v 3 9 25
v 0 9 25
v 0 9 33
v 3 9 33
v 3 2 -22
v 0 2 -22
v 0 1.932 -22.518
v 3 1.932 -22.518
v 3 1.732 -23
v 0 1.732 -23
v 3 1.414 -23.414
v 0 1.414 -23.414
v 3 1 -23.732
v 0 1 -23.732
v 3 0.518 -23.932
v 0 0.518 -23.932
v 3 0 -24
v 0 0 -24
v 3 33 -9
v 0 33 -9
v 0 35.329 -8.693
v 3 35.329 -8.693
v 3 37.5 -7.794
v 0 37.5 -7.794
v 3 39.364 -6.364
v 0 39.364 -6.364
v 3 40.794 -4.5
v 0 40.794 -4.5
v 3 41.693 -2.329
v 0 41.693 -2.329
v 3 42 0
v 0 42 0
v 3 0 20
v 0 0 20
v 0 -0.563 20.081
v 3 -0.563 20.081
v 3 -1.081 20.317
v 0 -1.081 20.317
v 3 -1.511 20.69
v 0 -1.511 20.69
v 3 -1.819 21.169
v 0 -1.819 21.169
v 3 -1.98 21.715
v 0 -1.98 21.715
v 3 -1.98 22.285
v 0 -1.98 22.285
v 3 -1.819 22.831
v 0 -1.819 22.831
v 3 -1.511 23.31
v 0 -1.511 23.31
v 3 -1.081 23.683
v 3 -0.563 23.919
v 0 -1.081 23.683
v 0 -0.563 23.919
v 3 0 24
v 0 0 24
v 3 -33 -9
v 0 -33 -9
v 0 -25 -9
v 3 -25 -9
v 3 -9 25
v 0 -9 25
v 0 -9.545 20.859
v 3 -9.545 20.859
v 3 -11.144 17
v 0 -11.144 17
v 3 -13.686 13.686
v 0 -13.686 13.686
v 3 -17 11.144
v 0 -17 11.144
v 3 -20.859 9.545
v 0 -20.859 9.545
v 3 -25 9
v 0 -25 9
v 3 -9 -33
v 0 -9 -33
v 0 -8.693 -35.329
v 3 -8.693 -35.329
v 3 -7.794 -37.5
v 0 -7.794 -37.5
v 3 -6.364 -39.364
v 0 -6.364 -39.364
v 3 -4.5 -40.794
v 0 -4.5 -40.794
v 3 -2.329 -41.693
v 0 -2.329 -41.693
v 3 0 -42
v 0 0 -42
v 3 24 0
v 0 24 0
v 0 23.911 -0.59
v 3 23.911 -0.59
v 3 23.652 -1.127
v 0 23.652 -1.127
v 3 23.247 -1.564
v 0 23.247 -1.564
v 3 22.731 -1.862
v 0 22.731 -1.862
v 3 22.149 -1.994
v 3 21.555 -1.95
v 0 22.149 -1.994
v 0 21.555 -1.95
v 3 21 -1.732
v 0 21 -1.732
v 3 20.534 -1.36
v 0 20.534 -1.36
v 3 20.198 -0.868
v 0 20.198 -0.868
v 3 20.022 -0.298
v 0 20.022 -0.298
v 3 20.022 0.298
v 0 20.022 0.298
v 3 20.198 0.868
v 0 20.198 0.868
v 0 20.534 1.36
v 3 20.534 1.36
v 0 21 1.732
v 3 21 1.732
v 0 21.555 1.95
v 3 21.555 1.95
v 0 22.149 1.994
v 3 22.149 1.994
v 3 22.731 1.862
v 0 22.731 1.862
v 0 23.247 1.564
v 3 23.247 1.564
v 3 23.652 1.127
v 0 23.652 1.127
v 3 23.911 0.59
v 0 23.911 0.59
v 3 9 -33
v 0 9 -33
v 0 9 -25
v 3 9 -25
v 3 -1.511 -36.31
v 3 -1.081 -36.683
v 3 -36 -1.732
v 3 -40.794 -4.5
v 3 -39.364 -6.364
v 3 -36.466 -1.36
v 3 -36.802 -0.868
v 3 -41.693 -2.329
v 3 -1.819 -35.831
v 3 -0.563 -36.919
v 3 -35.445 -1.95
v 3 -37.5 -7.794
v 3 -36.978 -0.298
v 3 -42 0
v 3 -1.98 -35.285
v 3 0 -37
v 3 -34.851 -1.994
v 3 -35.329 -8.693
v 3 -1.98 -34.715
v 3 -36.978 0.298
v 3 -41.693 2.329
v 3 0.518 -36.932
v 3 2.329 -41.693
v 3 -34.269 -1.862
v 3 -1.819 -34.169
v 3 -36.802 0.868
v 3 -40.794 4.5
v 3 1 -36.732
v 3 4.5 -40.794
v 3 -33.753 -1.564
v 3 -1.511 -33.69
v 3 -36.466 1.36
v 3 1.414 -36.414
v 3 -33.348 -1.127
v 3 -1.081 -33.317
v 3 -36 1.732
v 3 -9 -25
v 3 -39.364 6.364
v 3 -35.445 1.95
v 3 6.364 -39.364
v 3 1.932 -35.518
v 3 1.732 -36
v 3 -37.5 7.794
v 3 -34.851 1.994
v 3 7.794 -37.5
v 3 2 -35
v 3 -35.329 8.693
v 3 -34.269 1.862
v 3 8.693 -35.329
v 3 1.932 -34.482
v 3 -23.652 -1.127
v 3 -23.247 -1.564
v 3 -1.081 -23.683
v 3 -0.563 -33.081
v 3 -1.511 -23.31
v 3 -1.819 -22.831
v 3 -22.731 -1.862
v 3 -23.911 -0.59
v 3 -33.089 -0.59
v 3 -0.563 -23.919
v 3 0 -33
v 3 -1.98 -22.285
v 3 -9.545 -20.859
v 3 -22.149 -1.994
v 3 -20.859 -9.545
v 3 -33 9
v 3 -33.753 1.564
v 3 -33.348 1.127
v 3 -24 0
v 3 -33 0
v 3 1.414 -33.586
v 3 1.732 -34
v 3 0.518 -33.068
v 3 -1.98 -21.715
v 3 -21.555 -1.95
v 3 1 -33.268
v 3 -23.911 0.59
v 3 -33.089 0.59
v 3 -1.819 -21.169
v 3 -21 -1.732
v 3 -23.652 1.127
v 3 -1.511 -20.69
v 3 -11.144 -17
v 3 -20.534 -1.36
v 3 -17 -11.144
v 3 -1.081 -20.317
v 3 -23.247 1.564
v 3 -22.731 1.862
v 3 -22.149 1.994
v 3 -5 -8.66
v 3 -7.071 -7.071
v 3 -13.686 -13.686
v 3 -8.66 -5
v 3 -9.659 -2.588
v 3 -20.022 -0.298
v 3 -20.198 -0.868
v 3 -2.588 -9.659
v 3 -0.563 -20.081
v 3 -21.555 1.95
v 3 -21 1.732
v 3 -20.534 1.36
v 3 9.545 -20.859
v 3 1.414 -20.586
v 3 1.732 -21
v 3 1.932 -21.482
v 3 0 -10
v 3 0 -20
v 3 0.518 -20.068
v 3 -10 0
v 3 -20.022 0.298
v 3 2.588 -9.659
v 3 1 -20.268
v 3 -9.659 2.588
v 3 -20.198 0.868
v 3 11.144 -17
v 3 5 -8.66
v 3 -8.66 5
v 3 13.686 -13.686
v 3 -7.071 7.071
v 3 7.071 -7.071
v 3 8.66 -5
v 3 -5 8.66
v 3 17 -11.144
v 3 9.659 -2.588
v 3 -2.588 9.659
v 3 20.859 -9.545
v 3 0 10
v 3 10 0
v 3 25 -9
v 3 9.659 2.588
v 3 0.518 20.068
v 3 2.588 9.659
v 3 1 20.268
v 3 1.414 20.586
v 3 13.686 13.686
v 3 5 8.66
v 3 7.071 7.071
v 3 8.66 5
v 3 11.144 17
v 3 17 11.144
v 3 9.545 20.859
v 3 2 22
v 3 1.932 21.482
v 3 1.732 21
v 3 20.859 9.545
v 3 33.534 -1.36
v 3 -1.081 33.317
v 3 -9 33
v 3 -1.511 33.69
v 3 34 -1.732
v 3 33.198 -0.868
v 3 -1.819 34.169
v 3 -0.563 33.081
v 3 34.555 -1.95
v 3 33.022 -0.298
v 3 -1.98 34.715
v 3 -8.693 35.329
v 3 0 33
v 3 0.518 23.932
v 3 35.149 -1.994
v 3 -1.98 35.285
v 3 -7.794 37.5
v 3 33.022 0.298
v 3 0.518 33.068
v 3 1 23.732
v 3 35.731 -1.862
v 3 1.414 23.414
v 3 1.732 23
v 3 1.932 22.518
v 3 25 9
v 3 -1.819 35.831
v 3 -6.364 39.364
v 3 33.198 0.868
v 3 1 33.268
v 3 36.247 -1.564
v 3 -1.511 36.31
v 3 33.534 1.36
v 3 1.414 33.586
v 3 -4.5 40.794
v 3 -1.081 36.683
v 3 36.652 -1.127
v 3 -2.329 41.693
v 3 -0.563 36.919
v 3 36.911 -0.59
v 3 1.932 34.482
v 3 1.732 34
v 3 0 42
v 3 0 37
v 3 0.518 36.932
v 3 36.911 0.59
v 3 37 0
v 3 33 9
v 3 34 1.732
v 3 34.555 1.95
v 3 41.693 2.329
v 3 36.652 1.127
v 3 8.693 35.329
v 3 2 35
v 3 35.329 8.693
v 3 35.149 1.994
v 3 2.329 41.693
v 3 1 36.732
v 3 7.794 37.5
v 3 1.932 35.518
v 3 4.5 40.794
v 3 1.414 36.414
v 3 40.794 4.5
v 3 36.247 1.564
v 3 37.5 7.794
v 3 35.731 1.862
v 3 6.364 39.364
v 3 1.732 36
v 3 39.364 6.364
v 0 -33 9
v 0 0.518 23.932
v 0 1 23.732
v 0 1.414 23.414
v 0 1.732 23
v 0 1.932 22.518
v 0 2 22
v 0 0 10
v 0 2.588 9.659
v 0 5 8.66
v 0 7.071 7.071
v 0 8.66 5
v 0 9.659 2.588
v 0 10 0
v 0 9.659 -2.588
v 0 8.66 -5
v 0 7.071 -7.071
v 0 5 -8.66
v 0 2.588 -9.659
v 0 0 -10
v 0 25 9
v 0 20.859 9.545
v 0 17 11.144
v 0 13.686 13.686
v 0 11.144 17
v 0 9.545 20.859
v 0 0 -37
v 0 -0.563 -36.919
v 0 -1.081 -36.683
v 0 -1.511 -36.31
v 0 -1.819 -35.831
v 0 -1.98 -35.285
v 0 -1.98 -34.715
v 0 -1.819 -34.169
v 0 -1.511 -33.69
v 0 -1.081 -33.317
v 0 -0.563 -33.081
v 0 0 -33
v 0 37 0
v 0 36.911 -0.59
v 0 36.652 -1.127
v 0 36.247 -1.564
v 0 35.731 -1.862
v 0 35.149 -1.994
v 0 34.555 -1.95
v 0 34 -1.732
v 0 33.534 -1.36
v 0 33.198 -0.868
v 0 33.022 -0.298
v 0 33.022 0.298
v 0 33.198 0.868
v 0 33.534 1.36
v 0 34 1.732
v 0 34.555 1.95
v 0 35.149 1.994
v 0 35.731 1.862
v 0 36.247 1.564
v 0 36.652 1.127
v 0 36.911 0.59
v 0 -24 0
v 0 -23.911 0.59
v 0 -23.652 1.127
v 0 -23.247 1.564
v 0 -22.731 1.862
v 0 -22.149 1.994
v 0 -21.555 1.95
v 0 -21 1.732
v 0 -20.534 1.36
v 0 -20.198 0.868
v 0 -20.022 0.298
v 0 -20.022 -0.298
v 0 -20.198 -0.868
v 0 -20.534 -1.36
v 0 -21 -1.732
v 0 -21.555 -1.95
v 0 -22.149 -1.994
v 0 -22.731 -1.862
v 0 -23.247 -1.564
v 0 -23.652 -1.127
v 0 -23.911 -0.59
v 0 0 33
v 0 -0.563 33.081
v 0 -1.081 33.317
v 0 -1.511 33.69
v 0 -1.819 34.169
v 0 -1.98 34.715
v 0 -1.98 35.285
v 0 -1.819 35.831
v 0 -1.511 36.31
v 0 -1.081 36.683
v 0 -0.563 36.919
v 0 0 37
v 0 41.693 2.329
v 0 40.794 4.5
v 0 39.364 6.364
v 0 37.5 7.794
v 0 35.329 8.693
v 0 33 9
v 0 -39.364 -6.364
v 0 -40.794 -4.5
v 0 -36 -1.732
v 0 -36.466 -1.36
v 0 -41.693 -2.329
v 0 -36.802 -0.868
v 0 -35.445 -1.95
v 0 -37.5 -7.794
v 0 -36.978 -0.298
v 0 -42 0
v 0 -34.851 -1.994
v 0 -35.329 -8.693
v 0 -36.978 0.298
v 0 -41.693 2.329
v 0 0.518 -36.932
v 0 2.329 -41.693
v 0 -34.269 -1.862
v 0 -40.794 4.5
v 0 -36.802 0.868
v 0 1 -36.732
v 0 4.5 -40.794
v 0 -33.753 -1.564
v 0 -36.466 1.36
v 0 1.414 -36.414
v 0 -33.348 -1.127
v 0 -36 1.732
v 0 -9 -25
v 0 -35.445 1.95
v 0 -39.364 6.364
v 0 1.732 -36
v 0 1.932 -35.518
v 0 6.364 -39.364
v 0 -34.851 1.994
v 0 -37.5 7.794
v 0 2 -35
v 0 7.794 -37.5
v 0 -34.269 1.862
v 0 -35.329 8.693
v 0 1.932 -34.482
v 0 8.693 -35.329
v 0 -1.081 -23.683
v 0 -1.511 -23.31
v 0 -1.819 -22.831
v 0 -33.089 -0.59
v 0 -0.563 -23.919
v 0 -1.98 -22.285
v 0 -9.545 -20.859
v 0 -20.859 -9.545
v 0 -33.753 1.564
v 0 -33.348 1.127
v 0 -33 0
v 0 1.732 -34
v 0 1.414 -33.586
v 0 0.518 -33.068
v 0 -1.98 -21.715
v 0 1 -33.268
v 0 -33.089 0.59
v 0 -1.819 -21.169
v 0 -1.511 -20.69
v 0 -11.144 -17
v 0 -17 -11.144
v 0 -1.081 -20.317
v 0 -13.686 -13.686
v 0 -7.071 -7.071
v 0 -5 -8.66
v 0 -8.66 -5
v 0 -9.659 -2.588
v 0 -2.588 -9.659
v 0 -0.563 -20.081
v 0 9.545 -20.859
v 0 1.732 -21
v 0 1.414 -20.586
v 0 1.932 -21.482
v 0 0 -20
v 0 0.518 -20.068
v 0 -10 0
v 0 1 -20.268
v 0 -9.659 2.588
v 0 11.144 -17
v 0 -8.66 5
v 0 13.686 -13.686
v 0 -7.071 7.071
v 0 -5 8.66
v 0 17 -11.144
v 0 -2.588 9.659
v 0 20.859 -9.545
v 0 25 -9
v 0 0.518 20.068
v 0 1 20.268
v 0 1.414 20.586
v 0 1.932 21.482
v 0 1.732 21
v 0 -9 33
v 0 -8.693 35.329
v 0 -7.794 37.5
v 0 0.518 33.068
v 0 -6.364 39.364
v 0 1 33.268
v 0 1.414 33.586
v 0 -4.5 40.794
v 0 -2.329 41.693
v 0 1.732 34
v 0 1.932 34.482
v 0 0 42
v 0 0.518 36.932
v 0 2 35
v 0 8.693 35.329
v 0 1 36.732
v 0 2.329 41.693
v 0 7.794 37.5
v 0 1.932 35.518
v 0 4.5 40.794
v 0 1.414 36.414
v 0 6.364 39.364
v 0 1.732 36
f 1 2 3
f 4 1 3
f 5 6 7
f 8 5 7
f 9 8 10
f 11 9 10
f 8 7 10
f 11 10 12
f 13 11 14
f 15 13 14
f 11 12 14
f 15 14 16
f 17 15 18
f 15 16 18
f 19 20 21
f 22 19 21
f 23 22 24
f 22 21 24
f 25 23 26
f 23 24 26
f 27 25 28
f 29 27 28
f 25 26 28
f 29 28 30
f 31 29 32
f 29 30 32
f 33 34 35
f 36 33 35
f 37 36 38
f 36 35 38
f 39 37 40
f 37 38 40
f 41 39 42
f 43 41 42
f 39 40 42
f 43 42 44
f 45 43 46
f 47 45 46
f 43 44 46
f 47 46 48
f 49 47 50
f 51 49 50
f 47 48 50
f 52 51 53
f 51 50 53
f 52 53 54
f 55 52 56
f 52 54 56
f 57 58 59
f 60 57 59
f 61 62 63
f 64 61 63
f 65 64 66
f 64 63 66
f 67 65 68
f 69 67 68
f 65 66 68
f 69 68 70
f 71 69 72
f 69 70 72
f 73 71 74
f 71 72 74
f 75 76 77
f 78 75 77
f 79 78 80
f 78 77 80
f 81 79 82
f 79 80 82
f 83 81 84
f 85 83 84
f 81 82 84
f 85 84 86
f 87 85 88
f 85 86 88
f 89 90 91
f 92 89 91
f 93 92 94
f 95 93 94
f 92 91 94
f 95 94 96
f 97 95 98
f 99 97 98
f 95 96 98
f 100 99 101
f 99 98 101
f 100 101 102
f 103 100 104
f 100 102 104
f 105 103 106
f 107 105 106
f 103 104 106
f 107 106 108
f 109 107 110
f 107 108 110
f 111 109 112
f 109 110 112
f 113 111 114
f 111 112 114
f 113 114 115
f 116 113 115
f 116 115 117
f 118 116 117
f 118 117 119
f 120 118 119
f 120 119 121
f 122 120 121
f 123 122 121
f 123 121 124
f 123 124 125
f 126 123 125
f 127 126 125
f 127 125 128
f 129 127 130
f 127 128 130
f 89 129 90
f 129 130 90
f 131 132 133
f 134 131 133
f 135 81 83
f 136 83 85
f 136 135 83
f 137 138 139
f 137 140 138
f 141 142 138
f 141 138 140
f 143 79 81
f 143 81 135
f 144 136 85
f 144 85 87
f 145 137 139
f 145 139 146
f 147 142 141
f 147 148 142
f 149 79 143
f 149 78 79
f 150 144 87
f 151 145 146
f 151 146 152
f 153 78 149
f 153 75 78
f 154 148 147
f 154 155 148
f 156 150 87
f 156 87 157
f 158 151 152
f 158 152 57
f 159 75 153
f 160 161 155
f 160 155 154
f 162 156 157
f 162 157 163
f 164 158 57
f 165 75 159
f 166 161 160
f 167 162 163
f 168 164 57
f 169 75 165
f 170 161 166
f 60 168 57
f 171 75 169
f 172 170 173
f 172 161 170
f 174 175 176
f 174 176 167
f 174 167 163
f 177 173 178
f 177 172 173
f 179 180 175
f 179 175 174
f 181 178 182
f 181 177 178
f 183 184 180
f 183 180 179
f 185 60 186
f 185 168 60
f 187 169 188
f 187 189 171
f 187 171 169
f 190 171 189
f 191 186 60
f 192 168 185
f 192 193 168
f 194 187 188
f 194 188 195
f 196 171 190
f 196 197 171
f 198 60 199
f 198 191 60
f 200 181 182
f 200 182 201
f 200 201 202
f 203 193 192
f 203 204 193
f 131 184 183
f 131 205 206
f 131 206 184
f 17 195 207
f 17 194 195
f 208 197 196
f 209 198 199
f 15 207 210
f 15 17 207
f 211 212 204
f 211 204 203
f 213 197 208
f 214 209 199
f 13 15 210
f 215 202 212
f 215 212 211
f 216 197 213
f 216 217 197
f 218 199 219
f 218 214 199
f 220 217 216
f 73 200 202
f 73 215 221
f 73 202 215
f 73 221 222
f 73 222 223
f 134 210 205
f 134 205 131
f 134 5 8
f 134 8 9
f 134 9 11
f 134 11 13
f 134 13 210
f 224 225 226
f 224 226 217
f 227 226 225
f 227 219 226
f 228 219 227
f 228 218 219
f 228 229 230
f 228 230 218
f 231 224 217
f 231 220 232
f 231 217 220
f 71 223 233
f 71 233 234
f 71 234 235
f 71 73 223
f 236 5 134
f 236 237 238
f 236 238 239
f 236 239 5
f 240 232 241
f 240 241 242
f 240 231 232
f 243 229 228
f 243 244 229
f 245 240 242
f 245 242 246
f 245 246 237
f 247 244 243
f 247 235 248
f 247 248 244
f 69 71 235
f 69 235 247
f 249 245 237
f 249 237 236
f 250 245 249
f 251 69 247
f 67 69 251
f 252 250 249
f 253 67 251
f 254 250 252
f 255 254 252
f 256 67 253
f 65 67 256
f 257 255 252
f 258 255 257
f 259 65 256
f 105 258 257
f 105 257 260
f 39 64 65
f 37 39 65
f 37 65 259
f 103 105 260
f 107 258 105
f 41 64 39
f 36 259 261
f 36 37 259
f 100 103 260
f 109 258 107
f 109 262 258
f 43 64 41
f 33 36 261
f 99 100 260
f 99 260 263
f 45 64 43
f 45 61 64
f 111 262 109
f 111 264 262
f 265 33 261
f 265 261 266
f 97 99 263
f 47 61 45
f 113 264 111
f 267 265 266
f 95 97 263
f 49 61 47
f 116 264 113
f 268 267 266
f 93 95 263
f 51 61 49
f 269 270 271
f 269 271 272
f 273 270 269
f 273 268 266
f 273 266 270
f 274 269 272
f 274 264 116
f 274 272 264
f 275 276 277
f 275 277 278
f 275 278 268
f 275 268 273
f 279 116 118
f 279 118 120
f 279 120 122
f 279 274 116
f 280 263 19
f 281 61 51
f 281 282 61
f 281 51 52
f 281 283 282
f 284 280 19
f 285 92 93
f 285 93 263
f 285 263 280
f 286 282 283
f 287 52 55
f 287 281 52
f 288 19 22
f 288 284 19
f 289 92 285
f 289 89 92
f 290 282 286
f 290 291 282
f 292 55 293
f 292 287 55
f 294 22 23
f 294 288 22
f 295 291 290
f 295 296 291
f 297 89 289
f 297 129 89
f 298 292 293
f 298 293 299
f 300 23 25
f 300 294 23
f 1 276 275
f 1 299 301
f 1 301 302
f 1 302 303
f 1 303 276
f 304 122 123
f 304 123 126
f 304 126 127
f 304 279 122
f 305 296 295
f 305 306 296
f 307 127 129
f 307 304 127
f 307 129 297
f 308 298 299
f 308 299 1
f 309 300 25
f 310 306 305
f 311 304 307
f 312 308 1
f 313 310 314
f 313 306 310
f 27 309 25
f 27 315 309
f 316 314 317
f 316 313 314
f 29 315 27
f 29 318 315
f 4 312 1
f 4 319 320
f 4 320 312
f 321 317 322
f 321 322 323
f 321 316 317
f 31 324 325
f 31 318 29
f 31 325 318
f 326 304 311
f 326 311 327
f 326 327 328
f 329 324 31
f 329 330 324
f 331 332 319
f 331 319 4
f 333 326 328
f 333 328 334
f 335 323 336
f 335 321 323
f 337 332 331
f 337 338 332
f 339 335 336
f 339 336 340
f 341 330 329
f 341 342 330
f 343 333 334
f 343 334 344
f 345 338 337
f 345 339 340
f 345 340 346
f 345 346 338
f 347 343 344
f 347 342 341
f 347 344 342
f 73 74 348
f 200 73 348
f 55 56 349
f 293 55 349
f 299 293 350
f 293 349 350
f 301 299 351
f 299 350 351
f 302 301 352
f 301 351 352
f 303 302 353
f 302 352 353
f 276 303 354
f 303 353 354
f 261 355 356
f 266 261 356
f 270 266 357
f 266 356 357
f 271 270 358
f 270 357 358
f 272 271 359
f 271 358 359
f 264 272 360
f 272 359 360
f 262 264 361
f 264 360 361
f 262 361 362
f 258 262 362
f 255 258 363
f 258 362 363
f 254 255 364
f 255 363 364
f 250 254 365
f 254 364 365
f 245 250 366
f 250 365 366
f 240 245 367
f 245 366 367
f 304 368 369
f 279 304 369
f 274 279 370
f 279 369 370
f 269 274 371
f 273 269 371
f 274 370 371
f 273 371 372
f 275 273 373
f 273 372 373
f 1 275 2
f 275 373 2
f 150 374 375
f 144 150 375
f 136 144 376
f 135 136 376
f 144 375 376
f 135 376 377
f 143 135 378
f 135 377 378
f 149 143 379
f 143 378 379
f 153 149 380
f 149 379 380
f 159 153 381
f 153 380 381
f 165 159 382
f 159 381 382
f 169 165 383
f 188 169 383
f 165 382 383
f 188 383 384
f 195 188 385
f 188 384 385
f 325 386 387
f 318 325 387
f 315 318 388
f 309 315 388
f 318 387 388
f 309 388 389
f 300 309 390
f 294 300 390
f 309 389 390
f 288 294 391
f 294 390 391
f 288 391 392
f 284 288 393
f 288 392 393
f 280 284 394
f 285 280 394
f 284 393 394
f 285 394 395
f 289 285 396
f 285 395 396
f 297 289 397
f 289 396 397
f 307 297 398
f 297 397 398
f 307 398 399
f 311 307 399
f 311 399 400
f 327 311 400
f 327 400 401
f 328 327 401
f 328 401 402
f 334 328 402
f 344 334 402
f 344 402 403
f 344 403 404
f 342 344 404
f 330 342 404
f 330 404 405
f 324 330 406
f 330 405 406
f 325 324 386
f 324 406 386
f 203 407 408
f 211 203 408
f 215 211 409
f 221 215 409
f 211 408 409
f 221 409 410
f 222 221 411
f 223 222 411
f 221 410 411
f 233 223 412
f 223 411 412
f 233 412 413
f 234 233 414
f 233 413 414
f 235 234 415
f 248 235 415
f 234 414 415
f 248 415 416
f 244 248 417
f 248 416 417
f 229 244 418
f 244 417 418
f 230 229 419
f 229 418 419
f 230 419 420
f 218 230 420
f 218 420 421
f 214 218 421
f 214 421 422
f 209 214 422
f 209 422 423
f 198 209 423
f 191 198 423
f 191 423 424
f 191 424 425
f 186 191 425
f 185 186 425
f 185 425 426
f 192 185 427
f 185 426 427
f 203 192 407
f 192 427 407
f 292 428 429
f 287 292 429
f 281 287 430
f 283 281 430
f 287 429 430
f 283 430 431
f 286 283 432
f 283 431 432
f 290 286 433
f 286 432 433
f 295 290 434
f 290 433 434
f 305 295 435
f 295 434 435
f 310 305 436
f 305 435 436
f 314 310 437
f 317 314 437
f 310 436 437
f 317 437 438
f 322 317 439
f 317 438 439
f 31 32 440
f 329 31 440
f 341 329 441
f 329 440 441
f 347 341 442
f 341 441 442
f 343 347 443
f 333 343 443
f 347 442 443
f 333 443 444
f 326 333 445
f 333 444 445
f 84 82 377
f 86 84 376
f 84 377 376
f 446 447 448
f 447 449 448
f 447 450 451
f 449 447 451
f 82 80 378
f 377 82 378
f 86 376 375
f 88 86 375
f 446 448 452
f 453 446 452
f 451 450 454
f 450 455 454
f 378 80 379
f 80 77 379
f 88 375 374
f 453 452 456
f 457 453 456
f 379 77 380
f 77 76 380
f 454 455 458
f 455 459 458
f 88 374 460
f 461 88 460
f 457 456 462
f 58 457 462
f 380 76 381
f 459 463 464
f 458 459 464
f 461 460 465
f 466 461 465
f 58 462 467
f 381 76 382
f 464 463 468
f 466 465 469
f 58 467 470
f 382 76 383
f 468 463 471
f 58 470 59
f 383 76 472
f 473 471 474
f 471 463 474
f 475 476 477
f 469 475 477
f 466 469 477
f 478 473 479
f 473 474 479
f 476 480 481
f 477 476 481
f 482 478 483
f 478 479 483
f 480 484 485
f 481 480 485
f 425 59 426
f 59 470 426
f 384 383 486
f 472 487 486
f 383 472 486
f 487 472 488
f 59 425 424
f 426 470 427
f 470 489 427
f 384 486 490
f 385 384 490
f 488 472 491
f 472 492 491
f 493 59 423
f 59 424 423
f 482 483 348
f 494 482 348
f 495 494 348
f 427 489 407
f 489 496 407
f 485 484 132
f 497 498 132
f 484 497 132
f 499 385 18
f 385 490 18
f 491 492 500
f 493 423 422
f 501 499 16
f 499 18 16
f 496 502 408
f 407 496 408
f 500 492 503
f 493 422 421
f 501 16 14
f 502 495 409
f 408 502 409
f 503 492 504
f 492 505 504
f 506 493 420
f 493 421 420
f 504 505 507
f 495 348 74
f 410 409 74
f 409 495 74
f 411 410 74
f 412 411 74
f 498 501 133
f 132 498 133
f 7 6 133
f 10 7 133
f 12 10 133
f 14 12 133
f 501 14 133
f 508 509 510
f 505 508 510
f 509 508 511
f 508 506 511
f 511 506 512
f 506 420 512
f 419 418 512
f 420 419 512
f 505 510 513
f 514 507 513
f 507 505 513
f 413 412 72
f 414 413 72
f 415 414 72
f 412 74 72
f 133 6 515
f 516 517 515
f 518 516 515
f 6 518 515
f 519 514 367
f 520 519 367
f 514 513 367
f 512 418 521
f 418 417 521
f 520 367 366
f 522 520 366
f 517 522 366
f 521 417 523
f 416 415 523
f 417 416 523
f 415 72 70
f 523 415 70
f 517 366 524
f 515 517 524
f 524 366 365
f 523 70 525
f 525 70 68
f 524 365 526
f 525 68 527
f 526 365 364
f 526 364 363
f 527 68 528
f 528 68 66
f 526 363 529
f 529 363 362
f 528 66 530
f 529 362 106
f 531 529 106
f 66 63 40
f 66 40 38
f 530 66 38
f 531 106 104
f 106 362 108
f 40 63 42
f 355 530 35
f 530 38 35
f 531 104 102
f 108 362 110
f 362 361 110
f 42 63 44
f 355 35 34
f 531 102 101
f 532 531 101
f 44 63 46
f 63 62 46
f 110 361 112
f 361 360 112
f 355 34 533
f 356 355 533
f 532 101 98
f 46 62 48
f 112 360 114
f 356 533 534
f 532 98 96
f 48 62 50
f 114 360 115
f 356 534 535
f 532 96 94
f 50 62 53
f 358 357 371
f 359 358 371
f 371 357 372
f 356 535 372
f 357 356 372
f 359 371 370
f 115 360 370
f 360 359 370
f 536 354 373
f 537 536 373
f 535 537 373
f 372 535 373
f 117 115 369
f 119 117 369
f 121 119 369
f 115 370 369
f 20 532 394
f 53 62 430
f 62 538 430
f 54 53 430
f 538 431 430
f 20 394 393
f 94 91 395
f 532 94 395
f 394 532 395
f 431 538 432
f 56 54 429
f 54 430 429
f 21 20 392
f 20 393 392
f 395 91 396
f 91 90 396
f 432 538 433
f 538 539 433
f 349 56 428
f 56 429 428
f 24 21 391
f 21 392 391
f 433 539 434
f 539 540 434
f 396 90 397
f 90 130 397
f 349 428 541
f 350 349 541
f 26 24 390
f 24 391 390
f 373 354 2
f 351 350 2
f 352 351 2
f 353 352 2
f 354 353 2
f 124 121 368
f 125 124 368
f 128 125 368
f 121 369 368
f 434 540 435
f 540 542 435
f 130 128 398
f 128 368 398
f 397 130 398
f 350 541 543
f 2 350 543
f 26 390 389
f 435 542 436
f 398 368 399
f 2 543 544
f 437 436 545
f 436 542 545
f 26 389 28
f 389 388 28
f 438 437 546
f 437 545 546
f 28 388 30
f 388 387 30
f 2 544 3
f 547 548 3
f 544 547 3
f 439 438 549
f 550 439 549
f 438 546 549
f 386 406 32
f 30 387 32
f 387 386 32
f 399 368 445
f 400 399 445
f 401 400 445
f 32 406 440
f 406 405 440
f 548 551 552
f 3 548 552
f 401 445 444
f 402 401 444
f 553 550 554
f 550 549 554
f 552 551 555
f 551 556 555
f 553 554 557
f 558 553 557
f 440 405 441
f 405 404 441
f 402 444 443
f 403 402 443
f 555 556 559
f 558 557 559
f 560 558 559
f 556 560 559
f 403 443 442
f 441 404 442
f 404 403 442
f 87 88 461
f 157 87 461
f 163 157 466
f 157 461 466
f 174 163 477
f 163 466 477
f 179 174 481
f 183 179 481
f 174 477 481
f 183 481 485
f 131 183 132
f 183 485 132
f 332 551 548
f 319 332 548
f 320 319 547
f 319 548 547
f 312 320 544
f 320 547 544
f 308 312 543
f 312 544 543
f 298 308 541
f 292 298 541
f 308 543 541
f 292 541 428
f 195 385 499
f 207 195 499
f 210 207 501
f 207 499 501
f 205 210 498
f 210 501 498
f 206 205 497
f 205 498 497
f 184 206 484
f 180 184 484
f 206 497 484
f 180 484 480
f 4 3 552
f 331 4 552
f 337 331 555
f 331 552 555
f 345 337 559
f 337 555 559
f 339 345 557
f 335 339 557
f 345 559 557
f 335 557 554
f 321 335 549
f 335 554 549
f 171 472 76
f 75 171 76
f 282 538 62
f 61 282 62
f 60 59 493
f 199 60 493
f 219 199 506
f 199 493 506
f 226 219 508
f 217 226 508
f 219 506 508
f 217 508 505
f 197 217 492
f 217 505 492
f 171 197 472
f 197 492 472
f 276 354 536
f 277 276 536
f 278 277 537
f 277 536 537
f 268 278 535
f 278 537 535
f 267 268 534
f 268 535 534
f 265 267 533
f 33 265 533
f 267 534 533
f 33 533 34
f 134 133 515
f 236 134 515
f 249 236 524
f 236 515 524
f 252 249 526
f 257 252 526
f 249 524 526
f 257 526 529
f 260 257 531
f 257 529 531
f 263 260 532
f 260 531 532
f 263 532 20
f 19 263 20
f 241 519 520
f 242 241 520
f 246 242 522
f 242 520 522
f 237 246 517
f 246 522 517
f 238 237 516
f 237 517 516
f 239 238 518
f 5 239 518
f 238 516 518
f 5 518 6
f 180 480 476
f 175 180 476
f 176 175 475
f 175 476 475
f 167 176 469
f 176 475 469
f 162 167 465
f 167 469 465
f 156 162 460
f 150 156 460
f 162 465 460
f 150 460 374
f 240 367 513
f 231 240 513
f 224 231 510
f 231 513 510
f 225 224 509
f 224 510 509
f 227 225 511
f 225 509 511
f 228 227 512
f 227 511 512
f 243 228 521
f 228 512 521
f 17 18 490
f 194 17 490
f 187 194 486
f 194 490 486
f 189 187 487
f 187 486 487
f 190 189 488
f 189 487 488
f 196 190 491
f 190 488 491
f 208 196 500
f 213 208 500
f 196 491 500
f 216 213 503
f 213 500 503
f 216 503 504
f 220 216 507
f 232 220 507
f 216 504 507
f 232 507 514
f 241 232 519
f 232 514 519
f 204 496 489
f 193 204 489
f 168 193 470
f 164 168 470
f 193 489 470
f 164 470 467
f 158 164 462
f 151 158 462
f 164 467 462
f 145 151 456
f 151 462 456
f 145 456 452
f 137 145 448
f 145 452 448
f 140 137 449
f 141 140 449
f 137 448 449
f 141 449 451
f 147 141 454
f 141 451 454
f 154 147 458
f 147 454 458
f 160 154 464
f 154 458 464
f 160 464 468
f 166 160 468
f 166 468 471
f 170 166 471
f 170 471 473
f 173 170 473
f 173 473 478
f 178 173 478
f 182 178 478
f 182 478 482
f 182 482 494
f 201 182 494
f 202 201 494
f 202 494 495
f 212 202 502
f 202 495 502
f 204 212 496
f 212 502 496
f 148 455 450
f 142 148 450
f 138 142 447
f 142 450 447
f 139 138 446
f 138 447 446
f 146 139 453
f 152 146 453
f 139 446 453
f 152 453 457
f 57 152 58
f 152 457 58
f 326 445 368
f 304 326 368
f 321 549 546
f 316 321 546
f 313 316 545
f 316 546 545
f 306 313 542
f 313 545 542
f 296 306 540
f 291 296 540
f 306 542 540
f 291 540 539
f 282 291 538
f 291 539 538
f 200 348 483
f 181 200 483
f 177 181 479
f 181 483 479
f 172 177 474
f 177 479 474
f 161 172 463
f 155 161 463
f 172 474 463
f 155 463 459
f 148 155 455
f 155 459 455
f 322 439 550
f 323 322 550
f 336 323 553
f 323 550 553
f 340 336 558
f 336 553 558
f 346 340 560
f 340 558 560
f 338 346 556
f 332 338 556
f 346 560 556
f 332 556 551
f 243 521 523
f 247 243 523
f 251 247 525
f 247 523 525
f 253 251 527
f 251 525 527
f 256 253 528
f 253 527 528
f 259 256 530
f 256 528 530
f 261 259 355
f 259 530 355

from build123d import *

# Parameters (mm, degrees)
F1_DEPTH = 3


with BuildPart() as f1:
    # F0 (on Right) → F1 (new body)
    with BuildSketch(Plane.YZ):
        with BuildLine():
            Line((-33, 9), (-33, 0))
            Line((-33, 0), (-24, 0))
            ThreePointArc((-24, 0), (-26.6360389693, 6.3639610307), (-33, 9))
        make_face()
        with BuildLine():
            ThreePointArc((-37, 0), (-35, 2), (-33, 0))
            Line((-33, 0), (-33, 9))
            ThreePointArc((-33, 9), (-39.3639610307, 6.3639610307), (-42, 0))
            Line((-42, 0), (-37, 0))
        make_face()
        with BuildLine():
            Line((-24, 0), (-33, 0))
            Line((-33, 0), (-33, -9))
            ThreePointArc((-33, -9), (-26.6360389693, -6.3639610307), (-24, 0))
        make_face()
        with BuildLine():
            Line((-33, -9), (-33, 0))
            ThreePointArc((-33, 0), (-35, -2), (-37, 0))
            Line((-37, 0), (-42, 0))
            ThreePointArc((-42, 0), (-39.3639610307, -6.3639610307), (-33, -9))
        make_face()
        with BuildLine():
            ThreePointArc((-20, 0), (-22, -2), (-24, 0))
            ThreePointArc((-24, 0), (-26.6360389693, -6.3639610307), (-33, -9))
            Line((-33, -9), (-25, -9))
            ThreePointArc((-25, -9), (-13.686291501, -13.686291501), (-9, -25))
            Line((-9, -25), (-9, -33))
            ThreePointArc((-9, -33), (-6.3639610273, -26.6360389659), (9.7e-09, -24))
            ThreePointArc((9.7e-09, -24), (-2, -22.0000000048), (0, -20))
            Line((0, -20), (0, -10))
            ThreePointArc((0, -10), (-7.0710678119, -7.0710678119), (-10, 0))
            Line((-10, 0), (-20, 0))
        make_face()
        with BuildLine():
            ThreePointArc((-33, 9), (-26.6360389693, 6.3639610307), (-24, 0))
            ThreePointArc((-24, 0), (-22, 2), (-20, 0))
            Line((-20, 0), (-10, 0))
            ThreePointArc((-10, 0), (-7.0710678119, 7.0710678119), (0, 10))
            Line((0, 10), (0, 20))
            ThreePointArc((0, 20), (-2, 21.9999999928), (-1.44e-08, 24))
            ThreePointArc((-1.44e-08, 24), (-6.3639610358, 26.6360389744), (-9, 33))
            Line((-9, 33), (-9, 25))
            ThreePointArc((-9, 25), (-13.686291501, 13.686291501), (-25, 9))
            Line((-25, 9), (-33, 9))
        make_face()
        with BuildLine():
            Line((0, 20), (0, 10))
            ThreePointArc((0, 10), (7.0710678119, 7.0710678119), (10, 0))
            Line((10, 0), (20, 0))
            ThreePointArc((20, 0), (22, 2), (24, 0))
            ThreePointArc((24, 0), (26.6360389693, 6.3639610307), (33, 9))
            Line((33, 9), (25, 9))
            ThreePointArc((25, 9), (13.686291501, 13.686291501), (9, 25))
            Line((9, 25), (9, 33))
            ThreePointArc((9, 33), (6.3639610256, 26.6360389642), (-1.44e-08, 24))
            ThreePointArc((-1.44e-08, 24), (1.4142135573, 23.4142135675), (2, 22))
            ThreePointArc((2, 22), (1.4142135624, 20.5857864376), (0, 20))
        make_face()
        with BuildLine():
            ThreePointArc((10, 0), (7.0710678119, -7.0710678119), (0, -10))
            Line((0, -10), (0, -20))
            ThreePointArc((0, -20), (1.4142135624, -20.5857864376), (2, -22))
            ThreePointArc((2, -22), (1.4142135658, -23.414213559), (9.7e-09, -24))
            ThreePointArc((9.7e-09, -24), (6.3639610341, -26.6360389727), (9, -33))
            Line((9, -33), (9, -25))
            ThreePointArc((9, -25), (13.686291501, -13.686291501), (25, -9))
            Line((25, -9), (33, -9))
            ThreePointArc((33, -9), (26.6360389693, -6.3639610307), (24, 0))
            ThreePointArc((24, 0), (22, -2), (20, 0))
            Line((20, 0), (10, 0))
        make_face()
        with BuildLine():
            Line((0, 33), (-9, 33))
            ThreePointArc((-9, 33), (-6.3639610358, 26.6360389744), (-1.44e-08, 24))
            Line((0, 24), (0, 33))
        make_face()
        with BuildLine():
            ThreePointArc((0, 42), (-6.3639610307, 39.3639610307), (-9, 33))
            Line((-9, 33), (0, 33))
            ThreePointArc((0, 33), (-2, 35), (0, 37))
            Line((0, 37), (0, 42))
        make_face()
        with BuildLine():
            Line((0, -33), (-9, -33))
            ThreePointArc((-9, -33), (-6.3639610307, -39.3639610307), (0, -42))
            Line((0, -42), (0, -37))
            ThreePointArc((0, -37), (-2, -35), (0, -33))
        make_face()
        with BuildLine():
            ThreePointArc((9.7e-09, -24), (-6.3639610273, -26.6360389659), (-9, -33))
            Line((-9, -33), (0, -33))
            Line((0, -33), (0, -24))
        make_face()
        with BuildLine():
            ThreePointArc((9, 33), (6.3639610307, 39.3639610307), (0, 42))
            Line((0, 42), (0, 37))
            ThreePointArc((0, 37), (1.4142135624, 36.4142135624), (2, 35))
            ThreePointArc((2, 35), (1.4142135624, 33.5857864376), (0, 33))
            Line((0, 33), (0, 24))
            ThreePointArc((-1.44e-08, 24), (6.3639610256, 26.6360389642), (9, 33))
        make_face()
        with BuildLine():
            Line((0, -37), (0, -42))
            ThreePointArc((0, -42), (6.3639610307, -39.3639610307), (9, -33))
            Line((9, -33), (0, -33))
            ThreePointArc((0, -33), (1.4142135624, -33.5857864376), (2, -35))
            ThreePointArc((2, -35), (1.4142135624, -36.4142135624), (0, -37))
        make_face()
        with BuildLine():
            ThreePointArc((9, -33), (6.3639610341, -26.6360389727), (9.7e-09, -24))
            Line((0, -24), (0, -33))
            Line((0, -33), (9, -33))
        make_face()
        with BuildLine():
            ThreePointArc((33, 9), (26.6360389693, 6.3639610307), (24, 0))
            Line((24, 0), (33, 0))
            ThreePointArc((33, 0), (35, 2), (37, 0))
            Line((37, 0), (42, 0))
            ThreePointArc((42, 0), (39.3639610307, 6.3639610307), (33, 9))
        make_face()
        with BuildLine():
            Line((33, 0), (24, 0))
            ThreePointArc((24, 0), (26.6360389693, -6.3639610307), (33, -9))
            Line((33, -9), (33, 0))
        make_face()
        with BuildLine():
            ThreePointArc((37, 0), (35, -2), (33, 0))
            Line((33, 0), (33, -9))
            ThreePointArc((33, -9), (39.3639610307, -6.3639610307), (42, 0))
            Line((42, 0), (37, 0))
        make_face()
    extrude(amount=F1_DEPTH)


solid = f1.part
